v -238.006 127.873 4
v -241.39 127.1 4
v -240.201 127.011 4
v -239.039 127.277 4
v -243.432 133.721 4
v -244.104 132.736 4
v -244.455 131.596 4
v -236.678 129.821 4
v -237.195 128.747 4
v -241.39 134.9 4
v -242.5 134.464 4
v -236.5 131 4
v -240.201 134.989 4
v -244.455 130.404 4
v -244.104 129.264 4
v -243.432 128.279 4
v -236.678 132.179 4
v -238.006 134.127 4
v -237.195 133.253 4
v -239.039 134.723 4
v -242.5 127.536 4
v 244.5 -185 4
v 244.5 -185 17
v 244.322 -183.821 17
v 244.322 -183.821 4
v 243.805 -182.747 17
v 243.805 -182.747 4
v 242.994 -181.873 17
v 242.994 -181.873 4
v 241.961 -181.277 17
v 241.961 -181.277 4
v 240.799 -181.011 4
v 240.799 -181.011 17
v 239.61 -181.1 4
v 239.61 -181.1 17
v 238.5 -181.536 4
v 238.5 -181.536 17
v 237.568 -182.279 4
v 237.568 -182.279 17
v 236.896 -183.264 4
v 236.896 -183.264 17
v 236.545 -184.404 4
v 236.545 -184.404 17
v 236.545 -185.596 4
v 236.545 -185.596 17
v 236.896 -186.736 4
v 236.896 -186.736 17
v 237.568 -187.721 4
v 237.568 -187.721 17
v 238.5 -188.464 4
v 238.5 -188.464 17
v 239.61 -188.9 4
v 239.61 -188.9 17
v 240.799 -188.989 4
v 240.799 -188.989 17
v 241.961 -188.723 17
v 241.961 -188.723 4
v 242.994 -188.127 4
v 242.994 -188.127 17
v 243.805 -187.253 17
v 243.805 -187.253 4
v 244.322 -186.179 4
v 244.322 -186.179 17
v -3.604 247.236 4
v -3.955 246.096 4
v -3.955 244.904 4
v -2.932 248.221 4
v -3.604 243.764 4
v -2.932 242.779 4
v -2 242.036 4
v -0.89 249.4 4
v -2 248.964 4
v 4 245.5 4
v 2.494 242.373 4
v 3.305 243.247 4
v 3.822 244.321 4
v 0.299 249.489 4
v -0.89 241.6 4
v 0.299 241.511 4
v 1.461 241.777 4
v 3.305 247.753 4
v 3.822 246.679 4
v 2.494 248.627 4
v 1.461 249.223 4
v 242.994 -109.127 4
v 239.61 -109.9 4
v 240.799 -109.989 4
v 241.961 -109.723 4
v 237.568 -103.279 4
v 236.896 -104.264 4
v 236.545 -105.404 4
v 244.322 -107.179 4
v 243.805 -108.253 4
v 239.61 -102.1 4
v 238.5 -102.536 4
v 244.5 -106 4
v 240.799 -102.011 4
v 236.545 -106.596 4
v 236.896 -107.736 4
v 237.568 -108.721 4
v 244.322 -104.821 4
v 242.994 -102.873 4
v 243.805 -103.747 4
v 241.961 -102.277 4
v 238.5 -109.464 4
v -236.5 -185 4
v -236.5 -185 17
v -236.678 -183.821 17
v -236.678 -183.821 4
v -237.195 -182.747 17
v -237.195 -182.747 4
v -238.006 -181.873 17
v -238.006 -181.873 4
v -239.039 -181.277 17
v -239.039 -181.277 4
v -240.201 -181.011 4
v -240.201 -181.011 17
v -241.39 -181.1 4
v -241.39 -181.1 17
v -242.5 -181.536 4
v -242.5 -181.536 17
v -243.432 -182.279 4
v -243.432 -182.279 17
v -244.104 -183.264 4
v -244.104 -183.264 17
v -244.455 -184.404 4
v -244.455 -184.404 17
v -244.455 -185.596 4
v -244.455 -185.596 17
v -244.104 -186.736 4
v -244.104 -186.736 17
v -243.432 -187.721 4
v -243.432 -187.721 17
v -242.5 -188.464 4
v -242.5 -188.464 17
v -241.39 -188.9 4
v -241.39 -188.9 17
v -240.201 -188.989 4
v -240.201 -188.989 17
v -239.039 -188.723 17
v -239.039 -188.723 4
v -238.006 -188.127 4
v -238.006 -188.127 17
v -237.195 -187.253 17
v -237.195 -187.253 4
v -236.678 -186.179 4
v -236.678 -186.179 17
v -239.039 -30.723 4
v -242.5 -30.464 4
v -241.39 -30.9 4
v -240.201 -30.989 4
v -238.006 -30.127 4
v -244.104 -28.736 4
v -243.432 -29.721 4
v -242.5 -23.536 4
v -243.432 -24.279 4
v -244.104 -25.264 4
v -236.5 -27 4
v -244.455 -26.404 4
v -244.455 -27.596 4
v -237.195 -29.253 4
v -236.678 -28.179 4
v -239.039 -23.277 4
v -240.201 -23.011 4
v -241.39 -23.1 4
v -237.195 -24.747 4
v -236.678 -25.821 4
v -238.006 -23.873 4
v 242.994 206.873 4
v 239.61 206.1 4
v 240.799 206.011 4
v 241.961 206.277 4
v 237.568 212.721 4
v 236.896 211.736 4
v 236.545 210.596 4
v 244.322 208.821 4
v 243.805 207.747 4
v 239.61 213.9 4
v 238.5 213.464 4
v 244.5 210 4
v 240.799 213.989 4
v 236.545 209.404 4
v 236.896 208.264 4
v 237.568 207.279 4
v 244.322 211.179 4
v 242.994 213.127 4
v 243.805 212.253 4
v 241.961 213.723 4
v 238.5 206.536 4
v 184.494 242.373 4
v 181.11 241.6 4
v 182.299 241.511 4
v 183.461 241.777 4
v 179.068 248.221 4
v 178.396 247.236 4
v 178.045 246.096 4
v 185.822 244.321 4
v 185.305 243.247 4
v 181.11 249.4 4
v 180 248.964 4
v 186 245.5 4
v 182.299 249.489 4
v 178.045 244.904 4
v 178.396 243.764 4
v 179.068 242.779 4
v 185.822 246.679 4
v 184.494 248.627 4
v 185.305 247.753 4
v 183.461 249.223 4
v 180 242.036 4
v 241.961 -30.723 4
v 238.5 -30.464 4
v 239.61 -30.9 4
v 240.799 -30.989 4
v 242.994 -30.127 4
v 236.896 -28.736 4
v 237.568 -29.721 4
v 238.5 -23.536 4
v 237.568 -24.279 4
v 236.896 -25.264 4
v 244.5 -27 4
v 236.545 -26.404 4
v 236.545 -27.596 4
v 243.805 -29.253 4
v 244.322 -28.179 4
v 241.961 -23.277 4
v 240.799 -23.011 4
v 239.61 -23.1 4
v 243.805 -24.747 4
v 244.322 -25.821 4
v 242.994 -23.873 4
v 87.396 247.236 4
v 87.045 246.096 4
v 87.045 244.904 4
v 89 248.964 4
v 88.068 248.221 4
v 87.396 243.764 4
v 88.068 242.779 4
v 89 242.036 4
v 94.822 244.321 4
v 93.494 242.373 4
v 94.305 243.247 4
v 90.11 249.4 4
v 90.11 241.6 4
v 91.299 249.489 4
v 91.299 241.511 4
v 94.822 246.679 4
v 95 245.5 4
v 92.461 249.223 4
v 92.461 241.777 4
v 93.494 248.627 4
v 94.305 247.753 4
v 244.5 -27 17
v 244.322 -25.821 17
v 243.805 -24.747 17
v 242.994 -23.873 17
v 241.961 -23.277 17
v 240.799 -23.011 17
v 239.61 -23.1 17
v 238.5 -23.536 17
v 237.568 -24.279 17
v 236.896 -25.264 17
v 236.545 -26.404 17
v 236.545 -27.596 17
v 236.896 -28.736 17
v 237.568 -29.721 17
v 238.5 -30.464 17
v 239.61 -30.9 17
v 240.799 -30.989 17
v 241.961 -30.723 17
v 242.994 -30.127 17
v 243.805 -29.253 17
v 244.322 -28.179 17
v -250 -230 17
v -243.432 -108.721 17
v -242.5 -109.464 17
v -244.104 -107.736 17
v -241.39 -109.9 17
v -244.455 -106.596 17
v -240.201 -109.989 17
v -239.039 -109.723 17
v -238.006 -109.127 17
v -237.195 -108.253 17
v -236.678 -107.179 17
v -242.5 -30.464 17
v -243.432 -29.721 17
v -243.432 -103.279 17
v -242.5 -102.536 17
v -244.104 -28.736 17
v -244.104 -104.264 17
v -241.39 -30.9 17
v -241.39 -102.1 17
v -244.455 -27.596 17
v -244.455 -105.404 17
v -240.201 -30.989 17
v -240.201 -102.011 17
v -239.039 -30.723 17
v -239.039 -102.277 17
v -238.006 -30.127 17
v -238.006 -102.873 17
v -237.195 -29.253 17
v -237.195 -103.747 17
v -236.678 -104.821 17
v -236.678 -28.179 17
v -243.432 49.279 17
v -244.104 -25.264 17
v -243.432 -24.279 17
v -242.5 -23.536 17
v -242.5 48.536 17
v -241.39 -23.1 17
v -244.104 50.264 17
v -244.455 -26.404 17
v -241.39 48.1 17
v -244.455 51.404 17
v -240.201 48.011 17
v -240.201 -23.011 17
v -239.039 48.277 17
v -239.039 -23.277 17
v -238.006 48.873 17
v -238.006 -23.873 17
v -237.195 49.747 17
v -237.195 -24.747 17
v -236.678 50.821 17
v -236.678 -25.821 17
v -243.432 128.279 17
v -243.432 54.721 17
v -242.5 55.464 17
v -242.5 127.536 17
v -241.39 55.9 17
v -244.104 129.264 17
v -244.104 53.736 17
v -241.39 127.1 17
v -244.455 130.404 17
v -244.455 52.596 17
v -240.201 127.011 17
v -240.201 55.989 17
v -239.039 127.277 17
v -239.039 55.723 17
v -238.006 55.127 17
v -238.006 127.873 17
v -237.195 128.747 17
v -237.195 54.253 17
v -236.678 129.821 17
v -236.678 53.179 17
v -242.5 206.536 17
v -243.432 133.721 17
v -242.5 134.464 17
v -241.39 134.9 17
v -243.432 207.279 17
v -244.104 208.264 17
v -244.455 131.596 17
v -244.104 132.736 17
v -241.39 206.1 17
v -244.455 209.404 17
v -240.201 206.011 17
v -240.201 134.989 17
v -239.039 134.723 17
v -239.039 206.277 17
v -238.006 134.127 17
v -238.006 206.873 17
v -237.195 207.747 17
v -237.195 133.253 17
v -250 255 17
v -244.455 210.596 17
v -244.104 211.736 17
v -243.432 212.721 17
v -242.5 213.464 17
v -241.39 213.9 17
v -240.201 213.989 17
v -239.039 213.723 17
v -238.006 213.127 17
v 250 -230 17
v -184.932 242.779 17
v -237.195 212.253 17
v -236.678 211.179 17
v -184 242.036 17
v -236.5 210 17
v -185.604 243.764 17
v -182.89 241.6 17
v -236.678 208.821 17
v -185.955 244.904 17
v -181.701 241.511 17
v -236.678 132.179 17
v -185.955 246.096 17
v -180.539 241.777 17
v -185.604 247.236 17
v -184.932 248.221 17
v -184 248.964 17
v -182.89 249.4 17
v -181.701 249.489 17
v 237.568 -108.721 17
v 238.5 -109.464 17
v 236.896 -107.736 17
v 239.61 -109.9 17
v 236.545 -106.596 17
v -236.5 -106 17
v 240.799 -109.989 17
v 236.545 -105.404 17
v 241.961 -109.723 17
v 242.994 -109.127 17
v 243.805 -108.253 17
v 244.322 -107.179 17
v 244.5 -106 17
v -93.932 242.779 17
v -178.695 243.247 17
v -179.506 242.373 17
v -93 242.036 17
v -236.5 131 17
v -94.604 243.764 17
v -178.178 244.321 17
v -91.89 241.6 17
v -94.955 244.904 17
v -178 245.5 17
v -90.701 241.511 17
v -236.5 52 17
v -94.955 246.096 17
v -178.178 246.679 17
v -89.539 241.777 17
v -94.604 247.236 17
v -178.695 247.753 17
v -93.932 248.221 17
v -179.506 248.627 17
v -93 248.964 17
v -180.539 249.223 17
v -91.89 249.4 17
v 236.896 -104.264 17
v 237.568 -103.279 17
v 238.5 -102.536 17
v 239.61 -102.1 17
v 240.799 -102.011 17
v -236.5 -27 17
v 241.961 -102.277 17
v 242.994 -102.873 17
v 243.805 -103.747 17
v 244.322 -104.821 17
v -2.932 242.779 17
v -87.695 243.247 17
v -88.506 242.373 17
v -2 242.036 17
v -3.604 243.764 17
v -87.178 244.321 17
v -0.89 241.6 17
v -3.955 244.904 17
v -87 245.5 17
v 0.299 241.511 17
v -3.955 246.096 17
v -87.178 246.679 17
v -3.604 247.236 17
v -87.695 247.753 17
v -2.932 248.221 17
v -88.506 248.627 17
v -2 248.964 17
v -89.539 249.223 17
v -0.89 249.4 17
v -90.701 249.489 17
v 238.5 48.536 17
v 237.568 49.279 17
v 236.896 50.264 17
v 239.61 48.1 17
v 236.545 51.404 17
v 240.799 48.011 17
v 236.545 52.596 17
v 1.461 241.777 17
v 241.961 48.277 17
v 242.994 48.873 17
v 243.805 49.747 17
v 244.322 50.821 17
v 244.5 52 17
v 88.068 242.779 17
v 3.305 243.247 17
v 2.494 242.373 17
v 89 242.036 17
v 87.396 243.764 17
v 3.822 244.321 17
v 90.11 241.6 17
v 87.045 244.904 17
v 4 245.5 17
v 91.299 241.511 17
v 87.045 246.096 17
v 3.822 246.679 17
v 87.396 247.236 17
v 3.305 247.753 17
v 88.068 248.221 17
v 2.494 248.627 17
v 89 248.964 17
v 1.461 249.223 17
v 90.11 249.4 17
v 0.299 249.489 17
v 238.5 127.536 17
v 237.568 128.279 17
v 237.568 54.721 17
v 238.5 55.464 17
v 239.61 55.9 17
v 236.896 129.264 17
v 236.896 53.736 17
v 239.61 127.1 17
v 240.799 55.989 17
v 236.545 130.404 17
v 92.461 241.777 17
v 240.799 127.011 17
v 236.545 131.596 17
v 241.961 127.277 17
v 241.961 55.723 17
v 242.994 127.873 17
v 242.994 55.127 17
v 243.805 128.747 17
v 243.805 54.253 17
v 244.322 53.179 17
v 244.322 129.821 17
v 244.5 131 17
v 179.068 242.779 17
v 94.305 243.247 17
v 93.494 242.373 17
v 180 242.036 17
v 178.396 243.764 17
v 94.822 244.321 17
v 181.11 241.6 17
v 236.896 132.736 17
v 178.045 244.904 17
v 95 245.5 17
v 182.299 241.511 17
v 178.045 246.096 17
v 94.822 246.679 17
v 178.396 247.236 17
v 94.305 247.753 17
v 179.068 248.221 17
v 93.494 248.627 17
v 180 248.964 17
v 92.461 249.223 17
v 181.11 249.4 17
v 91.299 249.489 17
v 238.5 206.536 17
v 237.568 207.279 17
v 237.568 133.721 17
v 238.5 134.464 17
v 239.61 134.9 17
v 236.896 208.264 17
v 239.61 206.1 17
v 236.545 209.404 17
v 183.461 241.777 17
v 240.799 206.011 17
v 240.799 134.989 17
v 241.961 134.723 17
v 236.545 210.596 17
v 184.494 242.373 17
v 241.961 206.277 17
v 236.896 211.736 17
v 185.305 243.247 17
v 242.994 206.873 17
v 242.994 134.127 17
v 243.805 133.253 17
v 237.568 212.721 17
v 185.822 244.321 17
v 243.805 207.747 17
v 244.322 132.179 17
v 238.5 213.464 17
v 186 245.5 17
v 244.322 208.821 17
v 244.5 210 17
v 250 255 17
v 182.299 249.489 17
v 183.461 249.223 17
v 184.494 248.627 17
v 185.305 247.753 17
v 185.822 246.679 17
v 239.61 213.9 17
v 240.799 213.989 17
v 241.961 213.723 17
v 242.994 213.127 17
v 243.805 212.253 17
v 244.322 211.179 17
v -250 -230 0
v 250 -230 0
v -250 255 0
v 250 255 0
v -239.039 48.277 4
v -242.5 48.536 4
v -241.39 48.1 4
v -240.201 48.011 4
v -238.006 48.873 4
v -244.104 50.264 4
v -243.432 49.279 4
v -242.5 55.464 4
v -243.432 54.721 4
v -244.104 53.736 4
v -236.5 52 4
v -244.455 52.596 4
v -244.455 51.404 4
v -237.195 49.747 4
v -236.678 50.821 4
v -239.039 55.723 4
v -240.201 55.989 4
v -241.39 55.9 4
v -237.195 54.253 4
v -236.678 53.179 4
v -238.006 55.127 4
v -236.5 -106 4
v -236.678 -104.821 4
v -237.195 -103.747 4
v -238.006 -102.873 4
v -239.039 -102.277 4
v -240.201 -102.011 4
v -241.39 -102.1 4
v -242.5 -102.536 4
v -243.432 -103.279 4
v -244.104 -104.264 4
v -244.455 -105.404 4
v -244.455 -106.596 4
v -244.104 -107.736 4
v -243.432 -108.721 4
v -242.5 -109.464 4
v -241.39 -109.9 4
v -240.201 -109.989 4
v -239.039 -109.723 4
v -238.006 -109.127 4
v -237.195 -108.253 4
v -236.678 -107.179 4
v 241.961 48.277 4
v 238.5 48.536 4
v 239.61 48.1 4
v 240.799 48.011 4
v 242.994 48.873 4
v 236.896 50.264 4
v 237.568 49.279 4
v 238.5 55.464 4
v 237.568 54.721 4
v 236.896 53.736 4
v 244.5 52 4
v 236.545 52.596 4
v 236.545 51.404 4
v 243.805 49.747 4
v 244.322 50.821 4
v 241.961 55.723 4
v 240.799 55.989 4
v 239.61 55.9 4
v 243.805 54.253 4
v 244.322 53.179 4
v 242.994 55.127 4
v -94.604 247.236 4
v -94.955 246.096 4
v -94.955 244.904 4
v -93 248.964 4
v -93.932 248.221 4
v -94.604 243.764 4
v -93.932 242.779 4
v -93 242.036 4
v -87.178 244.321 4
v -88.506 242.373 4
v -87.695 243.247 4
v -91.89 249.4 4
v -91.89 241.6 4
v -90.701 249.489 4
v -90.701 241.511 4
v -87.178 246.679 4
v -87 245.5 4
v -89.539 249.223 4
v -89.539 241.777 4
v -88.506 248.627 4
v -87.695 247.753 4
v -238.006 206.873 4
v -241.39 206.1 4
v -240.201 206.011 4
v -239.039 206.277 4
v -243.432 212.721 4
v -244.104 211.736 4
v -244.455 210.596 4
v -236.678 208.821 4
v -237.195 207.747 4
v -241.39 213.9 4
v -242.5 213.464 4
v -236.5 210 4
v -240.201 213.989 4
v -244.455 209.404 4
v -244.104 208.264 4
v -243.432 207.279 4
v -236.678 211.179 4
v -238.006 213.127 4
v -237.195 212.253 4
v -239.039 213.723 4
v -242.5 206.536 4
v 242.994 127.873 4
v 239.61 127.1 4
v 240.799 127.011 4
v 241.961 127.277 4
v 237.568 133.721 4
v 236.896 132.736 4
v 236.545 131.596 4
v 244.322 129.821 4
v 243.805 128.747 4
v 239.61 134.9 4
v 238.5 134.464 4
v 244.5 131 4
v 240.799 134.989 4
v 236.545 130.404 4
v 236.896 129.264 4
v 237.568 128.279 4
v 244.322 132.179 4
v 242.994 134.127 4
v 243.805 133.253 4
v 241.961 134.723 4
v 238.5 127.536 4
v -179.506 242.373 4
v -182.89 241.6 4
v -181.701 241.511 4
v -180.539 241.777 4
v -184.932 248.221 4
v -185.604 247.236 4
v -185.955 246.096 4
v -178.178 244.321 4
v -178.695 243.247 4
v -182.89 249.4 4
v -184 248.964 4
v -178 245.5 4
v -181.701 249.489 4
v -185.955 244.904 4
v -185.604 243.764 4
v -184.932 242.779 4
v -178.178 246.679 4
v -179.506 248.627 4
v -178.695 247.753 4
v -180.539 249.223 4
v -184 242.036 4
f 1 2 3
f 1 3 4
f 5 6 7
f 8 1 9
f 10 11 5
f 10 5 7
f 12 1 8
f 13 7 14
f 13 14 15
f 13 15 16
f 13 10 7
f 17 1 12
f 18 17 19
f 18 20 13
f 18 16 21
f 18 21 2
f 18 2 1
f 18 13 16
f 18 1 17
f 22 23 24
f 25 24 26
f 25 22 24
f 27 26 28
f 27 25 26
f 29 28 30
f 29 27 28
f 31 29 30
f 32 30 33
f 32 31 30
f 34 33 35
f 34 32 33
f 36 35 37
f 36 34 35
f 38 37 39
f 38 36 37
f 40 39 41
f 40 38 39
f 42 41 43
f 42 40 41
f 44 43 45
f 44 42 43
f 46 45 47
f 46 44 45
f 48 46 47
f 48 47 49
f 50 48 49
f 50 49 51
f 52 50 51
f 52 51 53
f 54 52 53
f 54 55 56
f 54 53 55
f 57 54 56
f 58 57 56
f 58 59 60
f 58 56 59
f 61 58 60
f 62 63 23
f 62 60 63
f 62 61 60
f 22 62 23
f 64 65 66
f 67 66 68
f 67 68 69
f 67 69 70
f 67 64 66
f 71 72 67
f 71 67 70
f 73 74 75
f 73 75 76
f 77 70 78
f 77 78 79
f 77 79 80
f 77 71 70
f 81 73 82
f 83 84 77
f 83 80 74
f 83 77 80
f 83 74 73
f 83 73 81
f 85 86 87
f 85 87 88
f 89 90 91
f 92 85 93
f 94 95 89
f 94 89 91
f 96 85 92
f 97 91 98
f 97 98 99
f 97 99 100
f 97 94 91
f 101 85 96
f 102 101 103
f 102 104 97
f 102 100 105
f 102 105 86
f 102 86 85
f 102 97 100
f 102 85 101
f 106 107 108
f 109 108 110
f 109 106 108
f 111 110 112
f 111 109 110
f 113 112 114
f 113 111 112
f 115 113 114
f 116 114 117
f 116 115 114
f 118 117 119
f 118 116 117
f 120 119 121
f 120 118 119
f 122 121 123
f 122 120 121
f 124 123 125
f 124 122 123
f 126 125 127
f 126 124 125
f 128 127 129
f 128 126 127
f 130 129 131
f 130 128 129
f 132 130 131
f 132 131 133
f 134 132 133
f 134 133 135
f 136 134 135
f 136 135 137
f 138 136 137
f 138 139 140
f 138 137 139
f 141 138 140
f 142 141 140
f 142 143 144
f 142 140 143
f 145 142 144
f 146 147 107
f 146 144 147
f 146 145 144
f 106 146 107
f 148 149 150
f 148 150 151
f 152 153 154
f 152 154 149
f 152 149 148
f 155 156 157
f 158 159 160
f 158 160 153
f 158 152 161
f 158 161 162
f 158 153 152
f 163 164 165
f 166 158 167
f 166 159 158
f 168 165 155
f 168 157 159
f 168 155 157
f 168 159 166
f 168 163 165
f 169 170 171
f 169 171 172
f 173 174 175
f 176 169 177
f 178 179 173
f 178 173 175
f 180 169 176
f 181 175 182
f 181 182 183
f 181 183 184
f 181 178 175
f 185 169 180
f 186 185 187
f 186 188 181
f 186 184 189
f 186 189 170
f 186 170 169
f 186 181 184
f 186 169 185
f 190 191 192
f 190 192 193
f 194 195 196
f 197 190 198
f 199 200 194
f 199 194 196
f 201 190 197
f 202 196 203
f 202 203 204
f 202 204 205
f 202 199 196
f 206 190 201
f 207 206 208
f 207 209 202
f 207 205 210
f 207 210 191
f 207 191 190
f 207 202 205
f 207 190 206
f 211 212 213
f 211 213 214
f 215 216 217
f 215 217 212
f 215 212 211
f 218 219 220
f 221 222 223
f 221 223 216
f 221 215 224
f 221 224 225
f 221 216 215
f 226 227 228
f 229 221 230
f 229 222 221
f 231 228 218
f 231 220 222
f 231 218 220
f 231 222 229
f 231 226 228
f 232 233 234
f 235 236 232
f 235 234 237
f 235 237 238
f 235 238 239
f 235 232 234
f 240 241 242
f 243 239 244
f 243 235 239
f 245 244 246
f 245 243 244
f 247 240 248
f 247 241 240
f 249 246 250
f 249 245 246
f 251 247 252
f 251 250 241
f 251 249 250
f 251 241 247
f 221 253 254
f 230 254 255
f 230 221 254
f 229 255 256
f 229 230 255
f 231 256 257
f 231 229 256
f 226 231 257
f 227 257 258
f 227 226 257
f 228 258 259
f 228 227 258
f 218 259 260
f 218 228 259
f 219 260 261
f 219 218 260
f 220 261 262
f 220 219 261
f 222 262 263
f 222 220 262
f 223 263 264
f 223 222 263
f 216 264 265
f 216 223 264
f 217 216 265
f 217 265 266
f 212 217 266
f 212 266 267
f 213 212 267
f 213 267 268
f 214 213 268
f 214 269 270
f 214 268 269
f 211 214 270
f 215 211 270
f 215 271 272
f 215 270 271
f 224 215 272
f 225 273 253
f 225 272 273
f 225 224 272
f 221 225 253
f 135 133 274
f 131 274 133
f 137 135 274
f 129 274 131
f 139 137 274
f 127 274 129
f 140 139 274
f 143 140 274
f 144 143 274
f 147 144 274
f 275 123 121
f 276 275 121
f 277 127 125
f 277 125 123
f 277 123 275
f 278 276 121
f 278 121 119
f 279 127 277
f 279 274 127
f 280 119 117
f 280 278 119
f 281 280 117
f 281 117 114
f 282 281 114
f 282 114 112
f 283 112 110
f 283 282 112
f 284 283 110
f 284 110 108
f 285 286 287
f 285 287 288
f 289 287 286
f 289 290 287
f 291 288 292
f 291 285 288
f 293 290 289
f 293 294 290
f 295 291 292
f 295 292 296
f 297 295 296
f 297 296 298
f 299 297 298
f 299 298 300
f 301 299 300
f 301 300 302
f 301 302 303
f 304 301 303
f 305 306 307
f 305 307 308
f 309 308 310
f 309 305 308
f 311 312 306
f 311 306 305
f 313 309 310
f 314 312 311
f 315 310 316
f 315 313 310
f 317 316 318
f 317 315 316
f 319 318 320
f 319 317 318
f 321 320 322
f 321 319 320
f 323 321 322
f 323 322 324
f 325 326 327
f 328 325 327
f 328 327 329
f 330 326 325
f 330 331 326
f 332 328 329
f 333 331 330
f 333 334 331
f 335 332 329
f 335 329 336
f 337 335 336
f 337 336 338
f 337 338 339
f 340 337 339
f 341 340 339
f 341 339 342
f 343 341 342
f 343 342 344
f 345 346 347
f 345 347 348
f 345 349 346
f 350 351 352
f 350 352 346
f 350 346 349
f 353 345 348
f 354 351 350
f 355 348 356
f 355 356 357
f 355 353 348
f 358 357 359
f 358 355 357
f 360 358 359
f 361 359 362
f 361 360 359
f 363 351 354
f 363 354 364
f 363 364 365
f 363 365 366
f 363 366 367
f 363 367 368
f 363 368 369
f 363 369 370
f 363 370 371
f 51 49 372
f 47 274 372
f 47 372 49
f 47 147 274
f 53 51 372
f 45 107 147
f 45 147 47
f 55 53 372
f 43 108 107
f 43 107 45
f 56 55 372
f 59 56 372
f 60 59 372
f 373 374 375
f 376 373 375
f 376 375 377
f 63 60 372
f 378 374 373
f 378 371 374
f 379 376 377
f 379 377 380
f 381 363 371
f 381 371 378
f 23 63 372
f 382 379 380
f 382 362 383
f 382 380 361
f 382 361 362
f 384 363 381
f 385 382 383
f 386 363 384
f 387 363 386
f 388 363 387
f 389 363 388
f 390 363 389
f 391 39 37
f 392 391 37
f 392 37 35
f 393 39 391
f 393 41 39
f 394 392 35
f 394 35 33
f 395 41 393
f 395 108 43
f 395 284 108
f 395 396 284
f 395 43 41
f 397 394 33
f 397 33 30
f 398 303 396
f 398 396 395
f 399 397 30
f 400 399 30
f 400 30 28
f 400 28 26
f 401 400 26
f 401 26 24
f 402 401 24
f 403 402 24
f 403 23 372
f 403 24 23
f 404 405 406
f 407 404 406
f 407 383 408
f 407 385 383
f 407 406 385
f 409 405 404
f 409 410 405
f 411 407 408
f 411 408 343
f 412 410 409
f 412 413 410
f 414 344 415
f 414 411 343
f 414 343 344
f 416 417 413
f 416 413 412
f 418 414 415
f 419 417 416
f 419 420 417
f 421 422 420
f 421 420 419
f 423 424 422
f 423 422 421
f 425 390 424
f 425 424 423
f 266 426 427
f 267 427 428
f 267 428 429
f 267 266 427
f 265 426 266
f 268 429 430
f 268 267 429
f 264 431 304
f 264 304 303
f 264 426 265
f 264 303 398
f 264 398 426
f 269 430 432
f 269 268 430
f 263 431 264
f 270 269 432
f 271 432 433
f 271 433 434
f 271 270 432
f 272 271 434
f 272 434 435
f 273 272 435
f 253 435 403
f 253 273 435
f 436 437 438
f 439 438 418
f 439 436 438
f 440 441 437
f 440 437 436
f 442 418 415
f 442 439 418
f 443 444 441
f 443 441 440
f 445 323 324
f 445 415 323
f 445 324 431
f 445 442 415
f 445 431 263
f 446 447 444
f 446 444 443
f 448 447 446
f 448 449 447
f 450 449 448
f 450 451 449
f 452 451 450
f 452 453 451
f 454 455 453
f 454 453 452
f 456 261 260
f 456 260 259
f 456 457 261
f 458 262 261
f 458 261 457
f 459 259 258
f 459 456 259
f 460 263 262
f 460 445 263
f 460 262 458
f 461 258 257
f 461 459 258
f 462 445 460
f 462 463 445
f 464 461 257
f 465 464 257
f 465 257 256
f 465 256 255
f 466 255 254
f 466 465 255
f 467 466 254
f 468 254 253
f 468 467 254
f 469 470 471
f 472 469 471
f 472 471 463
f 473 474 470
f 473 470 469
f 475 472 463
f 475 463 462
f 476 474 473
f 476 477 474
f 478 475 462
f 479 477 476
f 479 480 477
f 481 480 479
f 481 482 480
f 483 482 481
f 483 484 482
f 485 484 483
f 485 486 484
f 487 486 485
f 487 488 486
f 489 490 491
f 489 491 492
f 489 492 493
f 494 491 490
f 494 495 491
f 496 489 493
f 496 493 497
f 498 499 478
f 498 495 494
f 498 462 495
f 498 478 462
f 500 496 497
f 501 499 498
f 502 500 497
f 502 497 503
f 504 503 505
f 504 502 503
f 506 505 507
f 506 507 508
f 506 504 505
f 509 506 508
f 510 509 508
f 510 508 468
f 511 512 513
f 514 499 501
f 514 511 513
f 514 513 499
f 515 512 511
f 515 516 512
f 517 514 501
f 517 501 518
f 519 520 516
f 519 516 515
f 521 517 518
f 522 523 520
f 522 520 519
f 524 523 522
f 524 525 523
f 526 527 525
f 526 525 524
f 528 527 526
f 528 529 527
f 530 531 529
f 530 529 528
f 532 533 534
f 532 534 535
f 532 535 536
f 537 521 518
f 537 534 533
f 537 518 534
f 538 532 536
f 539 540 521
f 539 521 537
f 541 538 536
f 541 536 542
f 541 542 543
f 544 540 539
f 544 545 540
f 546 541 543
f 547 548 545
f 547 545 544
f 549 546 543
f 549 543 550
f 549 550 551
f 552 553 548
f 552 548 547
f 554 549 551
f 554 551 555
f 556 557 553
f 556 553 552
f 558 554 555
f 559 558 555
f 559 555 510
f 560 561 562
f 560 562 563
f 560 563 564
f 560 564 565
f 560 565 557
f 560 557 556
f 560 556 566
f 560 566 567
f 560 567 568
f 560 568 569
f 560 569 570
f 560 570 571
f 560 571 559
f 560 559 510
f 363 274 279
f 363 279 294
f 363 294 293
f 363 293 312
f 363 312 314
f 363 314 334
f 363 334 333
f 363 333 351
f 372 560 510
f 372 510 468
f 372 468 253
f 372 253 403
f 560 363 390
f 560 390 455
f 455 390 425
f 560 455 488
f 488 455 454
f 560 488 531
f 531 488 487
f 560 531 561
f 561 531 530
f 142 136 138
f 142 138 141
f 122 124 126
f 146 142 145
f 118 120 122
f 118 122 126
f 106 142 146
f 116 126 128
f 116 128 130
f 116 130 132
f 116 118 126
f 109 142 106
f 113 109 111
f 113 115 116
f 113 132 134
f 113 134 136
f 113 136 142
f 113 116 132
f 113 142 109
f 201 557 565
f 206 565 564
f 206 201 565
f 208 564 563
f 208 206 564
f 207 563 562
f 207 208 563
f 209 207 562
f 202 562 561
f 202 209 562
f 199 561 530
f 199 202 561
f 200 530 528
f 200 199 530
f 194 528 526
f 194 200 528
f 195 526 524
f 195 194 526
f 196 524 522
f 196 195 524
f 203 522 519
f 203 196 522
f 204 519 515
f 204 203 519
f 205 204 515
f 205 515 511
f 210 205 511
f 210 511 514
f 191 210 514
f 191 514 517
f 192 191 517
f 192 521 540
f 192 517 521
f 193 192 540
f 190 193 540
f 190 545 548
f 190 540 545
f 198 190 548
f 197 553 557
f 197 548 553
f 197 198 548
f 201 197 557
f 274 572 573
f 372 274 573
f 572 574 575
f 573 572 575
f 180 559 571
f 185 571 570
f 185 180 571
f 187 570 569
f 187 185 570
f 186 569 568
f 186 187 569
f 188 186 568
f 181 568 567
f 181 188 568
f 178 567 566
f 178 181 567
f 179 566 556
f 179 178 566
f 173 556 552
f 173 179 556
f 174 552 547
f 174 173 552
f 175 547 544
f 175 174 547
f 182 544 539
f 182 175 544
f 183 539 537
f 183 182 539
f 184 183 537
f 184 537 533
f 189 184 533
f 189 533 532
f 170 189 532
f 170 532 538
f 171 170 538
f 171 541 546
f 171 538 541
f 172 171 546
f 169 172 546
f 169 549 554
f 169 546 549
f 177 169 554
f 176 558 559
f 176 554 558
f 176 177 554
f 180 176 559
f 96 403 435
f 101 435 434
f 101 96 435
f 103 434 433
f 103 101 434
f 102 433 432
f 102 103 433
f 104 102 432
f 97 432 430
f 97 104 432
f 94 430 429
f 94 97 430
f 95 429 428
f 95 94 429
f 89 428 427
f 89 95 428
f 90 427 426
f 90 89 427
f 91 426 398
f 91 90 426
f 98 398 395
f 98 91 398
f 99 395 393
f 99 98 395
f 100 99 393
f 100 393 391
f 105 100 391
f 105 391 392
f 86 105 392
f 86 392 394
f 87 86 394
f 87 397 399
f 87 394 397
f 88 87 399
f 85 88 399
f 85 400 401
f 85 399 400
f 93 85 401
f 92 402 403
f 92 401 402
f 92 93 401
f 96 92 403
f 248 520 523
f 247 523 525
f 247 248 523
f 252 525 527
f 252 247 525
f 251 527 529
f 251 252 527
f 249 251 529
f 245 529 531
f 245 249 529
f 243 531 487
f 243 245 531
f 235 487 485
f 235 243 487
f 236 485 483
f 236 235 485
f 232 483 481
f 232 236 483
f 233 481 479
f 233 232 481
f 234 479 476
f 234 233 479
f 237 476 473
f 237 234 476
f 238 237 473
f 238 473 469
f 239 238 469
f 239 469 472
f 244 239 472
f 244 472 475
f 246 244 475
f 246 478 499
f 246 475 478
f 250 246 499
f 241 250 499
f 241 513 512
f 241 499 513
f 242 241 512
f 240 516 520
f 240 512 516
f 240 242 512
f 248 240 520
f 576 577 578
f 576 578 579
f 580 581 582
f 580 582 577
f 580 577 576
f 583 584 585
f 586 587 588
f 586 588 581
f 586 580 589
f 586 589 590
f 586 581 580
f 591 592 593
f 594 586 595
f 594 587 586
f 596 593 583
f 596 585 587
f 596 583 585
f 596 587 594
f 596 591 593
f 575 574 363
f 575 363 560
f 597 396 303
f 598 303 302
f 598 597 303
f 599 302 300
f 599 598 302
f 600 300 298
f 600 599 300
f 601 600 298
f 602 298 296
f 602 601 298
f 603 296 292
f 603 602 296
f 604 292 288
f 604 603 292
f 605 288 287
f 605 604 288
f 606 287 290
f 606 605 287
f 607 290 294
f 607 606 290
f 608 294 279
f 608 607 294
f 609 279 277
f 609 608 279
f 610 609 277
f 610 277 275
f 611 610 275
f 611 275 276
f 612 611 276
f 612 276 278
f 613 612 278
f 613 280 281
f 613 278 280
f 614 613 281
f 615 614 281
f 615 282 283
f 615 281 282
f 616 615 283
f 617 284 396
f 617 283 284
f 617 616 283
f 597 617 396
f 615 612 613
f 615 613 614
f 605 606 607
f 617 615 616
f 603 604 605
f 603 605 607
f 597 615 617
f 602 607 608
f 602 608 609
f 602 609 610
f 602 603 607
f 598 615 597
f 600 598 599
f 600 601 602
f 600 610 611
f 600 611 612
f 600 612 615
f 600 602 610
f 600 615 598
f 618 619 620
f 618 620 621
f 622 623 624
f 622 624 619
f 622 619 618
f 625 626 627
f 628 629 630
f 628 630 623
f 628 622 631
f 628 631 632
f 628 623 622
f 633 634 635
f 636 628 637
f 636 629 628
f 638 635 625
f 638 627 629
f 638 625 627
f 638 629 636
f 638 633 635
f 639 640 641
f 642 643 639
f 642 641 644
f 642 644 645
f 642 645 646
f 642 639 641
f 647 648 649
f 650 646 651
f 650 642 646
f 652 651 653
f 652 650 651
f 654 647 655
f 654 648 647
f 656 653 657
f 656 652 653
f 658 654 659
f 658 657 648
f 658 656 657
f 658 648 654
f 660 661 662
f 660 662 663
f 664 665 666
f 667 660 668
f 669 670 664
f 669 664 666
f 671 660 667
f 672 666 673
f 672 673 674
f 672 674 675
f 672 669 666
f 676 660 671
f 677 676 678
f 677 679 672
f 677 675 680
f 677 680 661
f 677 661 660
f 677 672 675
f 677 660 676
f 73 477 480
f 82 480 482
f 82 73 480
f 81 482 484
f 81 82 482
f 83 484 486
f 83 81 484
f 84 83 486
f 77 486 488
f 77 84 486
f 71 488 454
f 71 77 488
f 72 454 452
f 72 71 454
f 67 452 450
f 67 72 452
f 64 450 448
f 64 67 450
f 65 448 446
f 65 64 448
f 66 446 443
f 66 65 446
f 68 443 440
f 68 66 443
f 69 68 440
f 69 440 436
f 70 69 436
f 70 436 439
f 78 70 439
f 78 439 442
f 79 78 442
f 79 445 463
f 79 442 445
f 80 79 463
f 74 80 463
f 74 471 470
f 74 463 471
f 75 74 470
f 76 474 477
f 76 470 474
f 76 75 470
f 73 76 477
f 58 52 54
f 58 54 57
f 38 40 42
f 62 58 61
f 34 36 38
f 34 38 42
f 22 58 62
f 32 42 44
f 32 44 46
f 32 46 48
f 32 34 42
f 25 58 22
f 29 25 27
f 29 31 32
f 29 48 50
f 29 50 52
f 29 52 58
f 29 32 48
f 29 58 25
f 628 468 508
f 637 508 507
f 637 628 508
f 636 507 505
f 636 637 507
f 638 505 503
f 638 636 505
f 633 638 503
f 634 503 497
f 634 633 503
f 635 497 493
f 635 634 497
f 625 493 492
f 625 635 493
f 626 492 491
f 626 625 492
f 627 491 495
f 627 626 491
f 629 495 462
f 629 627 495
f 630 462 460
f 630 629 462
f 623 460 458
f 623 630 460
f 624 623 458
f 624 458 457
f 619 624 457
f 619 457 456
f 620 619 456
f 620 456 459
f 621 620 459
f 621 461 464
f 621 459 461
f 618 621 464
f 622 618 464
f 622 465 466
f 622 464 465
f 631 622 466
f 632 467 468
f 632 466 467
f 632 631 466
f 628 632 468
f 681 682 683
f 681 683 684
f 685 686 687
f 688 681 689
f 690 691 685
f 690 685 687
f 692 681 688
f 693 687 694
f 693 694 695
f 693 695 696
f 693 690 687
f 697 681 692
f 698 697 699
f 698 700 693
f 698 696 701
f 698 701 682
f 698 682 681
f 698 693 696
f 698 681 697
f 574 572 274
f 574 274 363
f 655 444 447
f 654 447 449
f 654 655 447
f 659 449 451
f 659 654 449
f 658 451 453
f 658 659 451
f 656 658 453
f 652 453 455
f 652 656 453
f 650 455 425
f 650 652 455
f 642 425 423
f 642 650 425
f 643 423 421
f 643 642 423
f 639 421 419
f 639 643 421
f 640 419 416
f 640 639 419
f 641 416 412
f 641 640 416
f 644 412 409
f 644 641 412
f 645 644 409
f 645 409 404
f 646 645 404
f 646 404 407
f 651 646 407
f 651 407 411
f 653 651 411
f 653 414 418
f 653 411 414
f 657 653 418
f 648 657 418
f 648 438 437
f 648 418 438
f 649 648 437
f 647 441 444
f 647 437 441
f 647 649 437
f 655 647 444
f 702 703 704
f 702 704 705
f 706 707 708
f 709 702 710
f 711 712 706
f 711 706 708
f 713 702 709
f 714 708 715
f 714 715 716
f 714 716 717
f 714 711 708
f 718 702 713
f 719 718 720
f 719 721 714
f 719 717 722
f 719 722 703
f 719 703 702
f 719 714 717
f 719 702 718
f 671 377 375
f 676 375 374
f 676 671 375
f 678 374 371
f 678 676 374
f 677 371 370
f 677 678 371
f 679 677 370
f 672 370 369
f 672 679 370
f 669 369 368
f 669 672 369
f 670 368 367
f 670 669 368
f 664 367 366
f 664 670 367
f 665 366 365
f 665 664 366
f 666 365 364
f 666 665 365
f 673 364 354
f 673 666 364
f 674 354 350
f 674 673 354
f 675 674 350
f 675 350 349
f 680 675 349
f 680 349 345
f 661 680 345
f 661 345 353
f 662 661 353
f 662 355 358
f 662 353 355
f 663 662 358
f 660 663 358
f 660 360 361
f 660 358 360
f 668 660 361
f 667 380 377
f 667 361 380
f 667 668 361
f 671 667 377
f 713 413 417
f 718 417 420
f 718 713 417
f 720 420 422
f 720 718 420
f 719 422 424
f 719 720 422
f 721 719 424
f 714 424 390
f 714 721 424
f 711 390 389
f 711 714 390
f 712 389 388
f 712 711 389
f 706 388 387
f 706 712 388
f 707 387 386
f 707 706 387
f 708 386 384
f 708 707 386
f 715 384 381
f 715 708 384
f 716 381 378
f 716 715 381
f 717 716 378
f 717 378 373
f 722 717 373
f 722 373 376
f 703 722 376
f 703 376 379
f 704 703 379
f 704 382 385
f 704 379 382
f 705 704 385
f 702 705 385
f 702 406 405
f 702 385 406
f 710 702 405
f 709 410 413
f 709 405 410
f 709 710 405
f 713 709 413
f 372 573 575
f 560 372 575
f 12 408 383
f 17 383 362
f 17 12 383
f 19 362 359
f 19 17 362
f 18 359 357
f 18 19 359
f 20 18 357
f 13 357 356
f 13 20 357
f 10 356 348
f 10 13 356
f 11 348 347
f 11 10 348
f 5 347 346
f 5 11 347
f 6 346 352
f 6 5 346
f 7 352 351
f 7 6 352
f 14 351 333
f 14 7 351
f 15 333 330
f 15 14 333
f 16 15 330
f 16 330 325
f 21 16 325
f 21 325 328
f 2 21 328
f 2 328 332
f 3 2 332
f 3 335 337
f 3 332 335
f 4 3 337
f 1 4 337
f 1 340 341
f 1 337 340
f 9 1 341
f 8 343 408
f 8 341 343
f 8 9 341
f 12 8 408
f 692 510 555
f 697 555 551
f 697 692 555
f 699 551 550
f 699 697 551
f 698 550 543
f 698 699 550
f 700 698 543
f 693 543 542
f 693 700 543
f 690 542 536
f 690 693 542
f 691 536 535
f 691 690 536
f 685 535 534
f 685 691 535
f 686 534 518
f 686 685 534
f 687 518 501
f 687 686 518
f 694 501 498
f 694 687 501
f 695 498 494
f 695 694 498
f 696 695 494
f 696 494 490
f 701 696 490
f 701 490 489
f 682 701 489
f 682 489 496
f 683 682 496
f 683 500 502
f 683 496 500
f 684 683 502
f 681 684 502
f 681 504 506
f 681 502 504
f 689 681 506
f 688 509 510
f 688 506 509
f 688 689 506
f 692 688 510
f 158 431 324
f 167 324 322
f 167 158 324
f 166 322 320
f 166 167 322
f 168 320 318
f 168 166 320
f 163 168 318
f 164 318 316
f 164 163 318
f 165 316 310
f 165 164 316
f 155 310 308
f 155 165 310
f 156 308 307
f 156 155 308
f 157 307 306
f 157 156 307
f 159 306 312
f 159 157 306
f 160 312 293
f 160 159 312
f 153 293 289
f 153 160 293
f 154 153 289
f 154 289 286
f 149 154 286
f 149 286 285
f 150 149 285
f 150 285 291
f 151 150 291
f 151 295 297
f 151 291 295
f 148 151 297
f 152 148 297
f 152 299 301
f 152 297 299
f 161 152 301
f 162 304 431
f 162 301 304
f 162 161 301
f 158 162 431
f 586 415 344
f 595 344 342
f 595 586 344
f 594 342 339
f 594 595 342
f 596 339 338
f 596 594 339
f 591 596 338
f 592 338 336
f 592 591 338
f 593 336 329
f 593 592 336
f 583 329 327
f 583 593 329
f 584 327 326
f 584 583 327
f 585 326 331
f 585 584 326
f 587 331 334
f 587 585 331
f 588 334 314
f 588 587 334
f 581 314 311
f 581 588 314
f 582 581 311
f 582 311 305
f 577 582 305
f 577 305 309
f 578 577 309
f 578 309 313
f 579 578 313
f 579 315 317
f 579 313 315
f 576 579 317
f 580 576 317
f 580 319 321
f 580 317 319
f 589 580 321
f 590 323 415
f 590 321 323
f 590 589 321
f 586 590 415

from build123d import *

# Parameters (mm, degrees)
SKETCH1_W               = 500
SKETCH1_H               = 485
BOSS_EXTRUDE1_DEPTH     = 17
CUT_EXTRUDE1_DEPTH      = 25
CUT_EXTRUDE1_DEPTH_BACK = 13
SKETCH2_R               = 4


with BuildPart() as part:
    # Sketch1 → Boss-Extrude1 (new body)
    with BuildSketch(Plane.XY):
        with Locations((0, 12.5)):
            Rectangle(SKETCH1_W, SKETCH1_H)
    extrude(amount=BOSS_EXTRUDE1_DEPTH)

    # Sketch2 → Cut-Extrude1 (cut, two sides: drawn at the far end of the back side and taken through both)
    with BuildSketch(Plane.XY.offset(17).offset(-CUT_EXTRUDE1_DEPTH_BACK)):
        with Locations((240.5, 210)):
            Circle(SKETCH2_R)
        with Locations((182, 245.5)):
            Circle(SKETCH2_R)
        with Locations((-240.5, 210)):
            Circle(SKETCH2_R)
        with Locations((-240.5, 131)):
            Circle(SKETCH2_R)
        with Locations((240.5, 131)):
            Circle(SKETCH2_R)
        with Locations((-240.5, 52)):
            Circle(SKETCH2_R)
        with Locations((240.5, 52)):
            Circle(SKETCH2_R)
        with Locations((-240.5, -27)):
            Circle(SKETCH2_R)
        with Locations((240.5, -27)):
            Circle(SKETCH2_R)
        with Locations((-240.5, -106)):
            Circle(SKETCH2_R)
        with Locations((240.5, -106)):
            Circle(SKETCH2_R)
        with Locations((-182, 245.5)):
            Circle(SKETCH2_R)
        with Locations((-240.5, -185)):
            Circle(SKETCH2_R)
        with Locations((91, 245.5)):
            Circle(SKETCH2_R)
        with Locations((0, 245.5)):
            Circle(SKETCH2_R)
        with Locations((-91, 245.5)):
            Circle(SKETCH2_R)
        with Locations((240.5, -185)):
            Circle(SKETCH2_R)
    extrude(amount=CUT_EXTRUDE1_DEPTH + CUT_EXTRUDE1_DEPTH_BACK, mode=Mode.SUBTRACT)


solid = part.part
